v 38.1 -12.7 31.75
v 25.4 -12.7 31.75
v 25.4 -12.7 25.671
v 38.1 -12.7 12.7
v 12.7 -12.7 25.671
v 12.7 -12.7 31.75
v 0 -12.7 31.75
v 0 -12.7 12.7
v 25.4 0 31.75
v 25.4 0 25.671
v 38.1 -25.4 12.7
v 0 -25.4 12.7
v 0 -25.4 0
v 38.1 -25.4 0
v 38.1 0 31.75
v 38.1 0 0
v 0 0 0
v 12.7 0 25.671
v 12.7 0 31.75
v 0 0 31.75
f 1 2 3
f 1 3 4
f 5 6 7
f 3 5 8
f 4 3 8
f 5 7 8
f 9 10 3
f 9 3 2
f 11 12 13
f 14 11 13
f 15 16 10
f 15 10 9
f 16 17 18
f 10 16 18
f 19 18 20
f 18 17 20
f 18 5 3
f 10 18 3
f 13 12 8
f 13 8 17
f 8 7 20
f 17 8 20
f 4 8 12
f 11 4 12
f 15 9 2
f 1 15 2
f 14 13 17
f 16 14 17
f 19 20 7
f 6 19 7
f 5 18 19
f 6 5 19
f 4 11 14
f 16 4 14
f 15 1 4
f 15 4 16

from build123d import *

# Parameters (mm, degrees)
F1_DEPTH = 38.1
F2_W     = 12.7
F2_H     = 12.7
F3_DEPTH = 25.4
F4_W     = 12.7
F4_H     = 6.35
F5_DEPTH = 25.4


# Not quite as in the source:
# - a feature names something its author has since deleted; it is built from what else it names


with BuildPart() as f1:
    # F0 (on Right) → F1 (new body)
    with BuildSketch(Plane.YZ):
        Polygon((-25.4, 0), (0, 0), (0, 31.75), (-12.7, 31.75), (-12.7, 12.7), (-25.4, 12.7), align=None)
    extrude(amount=F1_DEPTH)

    # F2 (on Top) → F3 (join)
    with BuildSketch(Plane.XY):
        with Locations((19.05, -6.35)):
            Rectangle(F2_W, F2_H)
    extrude(amount=F3_DEPTH)

    # F4 (on Front) → F5 (cut)
    with BuildSketch(Plane.XZ):
        with Locations((19.05, 28.8461486514)):
            Rectangle(F4_W, F4_H)
    extrude(amount=F5_DEPTH, mode=Mode.SUBTRACT)


solid = f1.part
